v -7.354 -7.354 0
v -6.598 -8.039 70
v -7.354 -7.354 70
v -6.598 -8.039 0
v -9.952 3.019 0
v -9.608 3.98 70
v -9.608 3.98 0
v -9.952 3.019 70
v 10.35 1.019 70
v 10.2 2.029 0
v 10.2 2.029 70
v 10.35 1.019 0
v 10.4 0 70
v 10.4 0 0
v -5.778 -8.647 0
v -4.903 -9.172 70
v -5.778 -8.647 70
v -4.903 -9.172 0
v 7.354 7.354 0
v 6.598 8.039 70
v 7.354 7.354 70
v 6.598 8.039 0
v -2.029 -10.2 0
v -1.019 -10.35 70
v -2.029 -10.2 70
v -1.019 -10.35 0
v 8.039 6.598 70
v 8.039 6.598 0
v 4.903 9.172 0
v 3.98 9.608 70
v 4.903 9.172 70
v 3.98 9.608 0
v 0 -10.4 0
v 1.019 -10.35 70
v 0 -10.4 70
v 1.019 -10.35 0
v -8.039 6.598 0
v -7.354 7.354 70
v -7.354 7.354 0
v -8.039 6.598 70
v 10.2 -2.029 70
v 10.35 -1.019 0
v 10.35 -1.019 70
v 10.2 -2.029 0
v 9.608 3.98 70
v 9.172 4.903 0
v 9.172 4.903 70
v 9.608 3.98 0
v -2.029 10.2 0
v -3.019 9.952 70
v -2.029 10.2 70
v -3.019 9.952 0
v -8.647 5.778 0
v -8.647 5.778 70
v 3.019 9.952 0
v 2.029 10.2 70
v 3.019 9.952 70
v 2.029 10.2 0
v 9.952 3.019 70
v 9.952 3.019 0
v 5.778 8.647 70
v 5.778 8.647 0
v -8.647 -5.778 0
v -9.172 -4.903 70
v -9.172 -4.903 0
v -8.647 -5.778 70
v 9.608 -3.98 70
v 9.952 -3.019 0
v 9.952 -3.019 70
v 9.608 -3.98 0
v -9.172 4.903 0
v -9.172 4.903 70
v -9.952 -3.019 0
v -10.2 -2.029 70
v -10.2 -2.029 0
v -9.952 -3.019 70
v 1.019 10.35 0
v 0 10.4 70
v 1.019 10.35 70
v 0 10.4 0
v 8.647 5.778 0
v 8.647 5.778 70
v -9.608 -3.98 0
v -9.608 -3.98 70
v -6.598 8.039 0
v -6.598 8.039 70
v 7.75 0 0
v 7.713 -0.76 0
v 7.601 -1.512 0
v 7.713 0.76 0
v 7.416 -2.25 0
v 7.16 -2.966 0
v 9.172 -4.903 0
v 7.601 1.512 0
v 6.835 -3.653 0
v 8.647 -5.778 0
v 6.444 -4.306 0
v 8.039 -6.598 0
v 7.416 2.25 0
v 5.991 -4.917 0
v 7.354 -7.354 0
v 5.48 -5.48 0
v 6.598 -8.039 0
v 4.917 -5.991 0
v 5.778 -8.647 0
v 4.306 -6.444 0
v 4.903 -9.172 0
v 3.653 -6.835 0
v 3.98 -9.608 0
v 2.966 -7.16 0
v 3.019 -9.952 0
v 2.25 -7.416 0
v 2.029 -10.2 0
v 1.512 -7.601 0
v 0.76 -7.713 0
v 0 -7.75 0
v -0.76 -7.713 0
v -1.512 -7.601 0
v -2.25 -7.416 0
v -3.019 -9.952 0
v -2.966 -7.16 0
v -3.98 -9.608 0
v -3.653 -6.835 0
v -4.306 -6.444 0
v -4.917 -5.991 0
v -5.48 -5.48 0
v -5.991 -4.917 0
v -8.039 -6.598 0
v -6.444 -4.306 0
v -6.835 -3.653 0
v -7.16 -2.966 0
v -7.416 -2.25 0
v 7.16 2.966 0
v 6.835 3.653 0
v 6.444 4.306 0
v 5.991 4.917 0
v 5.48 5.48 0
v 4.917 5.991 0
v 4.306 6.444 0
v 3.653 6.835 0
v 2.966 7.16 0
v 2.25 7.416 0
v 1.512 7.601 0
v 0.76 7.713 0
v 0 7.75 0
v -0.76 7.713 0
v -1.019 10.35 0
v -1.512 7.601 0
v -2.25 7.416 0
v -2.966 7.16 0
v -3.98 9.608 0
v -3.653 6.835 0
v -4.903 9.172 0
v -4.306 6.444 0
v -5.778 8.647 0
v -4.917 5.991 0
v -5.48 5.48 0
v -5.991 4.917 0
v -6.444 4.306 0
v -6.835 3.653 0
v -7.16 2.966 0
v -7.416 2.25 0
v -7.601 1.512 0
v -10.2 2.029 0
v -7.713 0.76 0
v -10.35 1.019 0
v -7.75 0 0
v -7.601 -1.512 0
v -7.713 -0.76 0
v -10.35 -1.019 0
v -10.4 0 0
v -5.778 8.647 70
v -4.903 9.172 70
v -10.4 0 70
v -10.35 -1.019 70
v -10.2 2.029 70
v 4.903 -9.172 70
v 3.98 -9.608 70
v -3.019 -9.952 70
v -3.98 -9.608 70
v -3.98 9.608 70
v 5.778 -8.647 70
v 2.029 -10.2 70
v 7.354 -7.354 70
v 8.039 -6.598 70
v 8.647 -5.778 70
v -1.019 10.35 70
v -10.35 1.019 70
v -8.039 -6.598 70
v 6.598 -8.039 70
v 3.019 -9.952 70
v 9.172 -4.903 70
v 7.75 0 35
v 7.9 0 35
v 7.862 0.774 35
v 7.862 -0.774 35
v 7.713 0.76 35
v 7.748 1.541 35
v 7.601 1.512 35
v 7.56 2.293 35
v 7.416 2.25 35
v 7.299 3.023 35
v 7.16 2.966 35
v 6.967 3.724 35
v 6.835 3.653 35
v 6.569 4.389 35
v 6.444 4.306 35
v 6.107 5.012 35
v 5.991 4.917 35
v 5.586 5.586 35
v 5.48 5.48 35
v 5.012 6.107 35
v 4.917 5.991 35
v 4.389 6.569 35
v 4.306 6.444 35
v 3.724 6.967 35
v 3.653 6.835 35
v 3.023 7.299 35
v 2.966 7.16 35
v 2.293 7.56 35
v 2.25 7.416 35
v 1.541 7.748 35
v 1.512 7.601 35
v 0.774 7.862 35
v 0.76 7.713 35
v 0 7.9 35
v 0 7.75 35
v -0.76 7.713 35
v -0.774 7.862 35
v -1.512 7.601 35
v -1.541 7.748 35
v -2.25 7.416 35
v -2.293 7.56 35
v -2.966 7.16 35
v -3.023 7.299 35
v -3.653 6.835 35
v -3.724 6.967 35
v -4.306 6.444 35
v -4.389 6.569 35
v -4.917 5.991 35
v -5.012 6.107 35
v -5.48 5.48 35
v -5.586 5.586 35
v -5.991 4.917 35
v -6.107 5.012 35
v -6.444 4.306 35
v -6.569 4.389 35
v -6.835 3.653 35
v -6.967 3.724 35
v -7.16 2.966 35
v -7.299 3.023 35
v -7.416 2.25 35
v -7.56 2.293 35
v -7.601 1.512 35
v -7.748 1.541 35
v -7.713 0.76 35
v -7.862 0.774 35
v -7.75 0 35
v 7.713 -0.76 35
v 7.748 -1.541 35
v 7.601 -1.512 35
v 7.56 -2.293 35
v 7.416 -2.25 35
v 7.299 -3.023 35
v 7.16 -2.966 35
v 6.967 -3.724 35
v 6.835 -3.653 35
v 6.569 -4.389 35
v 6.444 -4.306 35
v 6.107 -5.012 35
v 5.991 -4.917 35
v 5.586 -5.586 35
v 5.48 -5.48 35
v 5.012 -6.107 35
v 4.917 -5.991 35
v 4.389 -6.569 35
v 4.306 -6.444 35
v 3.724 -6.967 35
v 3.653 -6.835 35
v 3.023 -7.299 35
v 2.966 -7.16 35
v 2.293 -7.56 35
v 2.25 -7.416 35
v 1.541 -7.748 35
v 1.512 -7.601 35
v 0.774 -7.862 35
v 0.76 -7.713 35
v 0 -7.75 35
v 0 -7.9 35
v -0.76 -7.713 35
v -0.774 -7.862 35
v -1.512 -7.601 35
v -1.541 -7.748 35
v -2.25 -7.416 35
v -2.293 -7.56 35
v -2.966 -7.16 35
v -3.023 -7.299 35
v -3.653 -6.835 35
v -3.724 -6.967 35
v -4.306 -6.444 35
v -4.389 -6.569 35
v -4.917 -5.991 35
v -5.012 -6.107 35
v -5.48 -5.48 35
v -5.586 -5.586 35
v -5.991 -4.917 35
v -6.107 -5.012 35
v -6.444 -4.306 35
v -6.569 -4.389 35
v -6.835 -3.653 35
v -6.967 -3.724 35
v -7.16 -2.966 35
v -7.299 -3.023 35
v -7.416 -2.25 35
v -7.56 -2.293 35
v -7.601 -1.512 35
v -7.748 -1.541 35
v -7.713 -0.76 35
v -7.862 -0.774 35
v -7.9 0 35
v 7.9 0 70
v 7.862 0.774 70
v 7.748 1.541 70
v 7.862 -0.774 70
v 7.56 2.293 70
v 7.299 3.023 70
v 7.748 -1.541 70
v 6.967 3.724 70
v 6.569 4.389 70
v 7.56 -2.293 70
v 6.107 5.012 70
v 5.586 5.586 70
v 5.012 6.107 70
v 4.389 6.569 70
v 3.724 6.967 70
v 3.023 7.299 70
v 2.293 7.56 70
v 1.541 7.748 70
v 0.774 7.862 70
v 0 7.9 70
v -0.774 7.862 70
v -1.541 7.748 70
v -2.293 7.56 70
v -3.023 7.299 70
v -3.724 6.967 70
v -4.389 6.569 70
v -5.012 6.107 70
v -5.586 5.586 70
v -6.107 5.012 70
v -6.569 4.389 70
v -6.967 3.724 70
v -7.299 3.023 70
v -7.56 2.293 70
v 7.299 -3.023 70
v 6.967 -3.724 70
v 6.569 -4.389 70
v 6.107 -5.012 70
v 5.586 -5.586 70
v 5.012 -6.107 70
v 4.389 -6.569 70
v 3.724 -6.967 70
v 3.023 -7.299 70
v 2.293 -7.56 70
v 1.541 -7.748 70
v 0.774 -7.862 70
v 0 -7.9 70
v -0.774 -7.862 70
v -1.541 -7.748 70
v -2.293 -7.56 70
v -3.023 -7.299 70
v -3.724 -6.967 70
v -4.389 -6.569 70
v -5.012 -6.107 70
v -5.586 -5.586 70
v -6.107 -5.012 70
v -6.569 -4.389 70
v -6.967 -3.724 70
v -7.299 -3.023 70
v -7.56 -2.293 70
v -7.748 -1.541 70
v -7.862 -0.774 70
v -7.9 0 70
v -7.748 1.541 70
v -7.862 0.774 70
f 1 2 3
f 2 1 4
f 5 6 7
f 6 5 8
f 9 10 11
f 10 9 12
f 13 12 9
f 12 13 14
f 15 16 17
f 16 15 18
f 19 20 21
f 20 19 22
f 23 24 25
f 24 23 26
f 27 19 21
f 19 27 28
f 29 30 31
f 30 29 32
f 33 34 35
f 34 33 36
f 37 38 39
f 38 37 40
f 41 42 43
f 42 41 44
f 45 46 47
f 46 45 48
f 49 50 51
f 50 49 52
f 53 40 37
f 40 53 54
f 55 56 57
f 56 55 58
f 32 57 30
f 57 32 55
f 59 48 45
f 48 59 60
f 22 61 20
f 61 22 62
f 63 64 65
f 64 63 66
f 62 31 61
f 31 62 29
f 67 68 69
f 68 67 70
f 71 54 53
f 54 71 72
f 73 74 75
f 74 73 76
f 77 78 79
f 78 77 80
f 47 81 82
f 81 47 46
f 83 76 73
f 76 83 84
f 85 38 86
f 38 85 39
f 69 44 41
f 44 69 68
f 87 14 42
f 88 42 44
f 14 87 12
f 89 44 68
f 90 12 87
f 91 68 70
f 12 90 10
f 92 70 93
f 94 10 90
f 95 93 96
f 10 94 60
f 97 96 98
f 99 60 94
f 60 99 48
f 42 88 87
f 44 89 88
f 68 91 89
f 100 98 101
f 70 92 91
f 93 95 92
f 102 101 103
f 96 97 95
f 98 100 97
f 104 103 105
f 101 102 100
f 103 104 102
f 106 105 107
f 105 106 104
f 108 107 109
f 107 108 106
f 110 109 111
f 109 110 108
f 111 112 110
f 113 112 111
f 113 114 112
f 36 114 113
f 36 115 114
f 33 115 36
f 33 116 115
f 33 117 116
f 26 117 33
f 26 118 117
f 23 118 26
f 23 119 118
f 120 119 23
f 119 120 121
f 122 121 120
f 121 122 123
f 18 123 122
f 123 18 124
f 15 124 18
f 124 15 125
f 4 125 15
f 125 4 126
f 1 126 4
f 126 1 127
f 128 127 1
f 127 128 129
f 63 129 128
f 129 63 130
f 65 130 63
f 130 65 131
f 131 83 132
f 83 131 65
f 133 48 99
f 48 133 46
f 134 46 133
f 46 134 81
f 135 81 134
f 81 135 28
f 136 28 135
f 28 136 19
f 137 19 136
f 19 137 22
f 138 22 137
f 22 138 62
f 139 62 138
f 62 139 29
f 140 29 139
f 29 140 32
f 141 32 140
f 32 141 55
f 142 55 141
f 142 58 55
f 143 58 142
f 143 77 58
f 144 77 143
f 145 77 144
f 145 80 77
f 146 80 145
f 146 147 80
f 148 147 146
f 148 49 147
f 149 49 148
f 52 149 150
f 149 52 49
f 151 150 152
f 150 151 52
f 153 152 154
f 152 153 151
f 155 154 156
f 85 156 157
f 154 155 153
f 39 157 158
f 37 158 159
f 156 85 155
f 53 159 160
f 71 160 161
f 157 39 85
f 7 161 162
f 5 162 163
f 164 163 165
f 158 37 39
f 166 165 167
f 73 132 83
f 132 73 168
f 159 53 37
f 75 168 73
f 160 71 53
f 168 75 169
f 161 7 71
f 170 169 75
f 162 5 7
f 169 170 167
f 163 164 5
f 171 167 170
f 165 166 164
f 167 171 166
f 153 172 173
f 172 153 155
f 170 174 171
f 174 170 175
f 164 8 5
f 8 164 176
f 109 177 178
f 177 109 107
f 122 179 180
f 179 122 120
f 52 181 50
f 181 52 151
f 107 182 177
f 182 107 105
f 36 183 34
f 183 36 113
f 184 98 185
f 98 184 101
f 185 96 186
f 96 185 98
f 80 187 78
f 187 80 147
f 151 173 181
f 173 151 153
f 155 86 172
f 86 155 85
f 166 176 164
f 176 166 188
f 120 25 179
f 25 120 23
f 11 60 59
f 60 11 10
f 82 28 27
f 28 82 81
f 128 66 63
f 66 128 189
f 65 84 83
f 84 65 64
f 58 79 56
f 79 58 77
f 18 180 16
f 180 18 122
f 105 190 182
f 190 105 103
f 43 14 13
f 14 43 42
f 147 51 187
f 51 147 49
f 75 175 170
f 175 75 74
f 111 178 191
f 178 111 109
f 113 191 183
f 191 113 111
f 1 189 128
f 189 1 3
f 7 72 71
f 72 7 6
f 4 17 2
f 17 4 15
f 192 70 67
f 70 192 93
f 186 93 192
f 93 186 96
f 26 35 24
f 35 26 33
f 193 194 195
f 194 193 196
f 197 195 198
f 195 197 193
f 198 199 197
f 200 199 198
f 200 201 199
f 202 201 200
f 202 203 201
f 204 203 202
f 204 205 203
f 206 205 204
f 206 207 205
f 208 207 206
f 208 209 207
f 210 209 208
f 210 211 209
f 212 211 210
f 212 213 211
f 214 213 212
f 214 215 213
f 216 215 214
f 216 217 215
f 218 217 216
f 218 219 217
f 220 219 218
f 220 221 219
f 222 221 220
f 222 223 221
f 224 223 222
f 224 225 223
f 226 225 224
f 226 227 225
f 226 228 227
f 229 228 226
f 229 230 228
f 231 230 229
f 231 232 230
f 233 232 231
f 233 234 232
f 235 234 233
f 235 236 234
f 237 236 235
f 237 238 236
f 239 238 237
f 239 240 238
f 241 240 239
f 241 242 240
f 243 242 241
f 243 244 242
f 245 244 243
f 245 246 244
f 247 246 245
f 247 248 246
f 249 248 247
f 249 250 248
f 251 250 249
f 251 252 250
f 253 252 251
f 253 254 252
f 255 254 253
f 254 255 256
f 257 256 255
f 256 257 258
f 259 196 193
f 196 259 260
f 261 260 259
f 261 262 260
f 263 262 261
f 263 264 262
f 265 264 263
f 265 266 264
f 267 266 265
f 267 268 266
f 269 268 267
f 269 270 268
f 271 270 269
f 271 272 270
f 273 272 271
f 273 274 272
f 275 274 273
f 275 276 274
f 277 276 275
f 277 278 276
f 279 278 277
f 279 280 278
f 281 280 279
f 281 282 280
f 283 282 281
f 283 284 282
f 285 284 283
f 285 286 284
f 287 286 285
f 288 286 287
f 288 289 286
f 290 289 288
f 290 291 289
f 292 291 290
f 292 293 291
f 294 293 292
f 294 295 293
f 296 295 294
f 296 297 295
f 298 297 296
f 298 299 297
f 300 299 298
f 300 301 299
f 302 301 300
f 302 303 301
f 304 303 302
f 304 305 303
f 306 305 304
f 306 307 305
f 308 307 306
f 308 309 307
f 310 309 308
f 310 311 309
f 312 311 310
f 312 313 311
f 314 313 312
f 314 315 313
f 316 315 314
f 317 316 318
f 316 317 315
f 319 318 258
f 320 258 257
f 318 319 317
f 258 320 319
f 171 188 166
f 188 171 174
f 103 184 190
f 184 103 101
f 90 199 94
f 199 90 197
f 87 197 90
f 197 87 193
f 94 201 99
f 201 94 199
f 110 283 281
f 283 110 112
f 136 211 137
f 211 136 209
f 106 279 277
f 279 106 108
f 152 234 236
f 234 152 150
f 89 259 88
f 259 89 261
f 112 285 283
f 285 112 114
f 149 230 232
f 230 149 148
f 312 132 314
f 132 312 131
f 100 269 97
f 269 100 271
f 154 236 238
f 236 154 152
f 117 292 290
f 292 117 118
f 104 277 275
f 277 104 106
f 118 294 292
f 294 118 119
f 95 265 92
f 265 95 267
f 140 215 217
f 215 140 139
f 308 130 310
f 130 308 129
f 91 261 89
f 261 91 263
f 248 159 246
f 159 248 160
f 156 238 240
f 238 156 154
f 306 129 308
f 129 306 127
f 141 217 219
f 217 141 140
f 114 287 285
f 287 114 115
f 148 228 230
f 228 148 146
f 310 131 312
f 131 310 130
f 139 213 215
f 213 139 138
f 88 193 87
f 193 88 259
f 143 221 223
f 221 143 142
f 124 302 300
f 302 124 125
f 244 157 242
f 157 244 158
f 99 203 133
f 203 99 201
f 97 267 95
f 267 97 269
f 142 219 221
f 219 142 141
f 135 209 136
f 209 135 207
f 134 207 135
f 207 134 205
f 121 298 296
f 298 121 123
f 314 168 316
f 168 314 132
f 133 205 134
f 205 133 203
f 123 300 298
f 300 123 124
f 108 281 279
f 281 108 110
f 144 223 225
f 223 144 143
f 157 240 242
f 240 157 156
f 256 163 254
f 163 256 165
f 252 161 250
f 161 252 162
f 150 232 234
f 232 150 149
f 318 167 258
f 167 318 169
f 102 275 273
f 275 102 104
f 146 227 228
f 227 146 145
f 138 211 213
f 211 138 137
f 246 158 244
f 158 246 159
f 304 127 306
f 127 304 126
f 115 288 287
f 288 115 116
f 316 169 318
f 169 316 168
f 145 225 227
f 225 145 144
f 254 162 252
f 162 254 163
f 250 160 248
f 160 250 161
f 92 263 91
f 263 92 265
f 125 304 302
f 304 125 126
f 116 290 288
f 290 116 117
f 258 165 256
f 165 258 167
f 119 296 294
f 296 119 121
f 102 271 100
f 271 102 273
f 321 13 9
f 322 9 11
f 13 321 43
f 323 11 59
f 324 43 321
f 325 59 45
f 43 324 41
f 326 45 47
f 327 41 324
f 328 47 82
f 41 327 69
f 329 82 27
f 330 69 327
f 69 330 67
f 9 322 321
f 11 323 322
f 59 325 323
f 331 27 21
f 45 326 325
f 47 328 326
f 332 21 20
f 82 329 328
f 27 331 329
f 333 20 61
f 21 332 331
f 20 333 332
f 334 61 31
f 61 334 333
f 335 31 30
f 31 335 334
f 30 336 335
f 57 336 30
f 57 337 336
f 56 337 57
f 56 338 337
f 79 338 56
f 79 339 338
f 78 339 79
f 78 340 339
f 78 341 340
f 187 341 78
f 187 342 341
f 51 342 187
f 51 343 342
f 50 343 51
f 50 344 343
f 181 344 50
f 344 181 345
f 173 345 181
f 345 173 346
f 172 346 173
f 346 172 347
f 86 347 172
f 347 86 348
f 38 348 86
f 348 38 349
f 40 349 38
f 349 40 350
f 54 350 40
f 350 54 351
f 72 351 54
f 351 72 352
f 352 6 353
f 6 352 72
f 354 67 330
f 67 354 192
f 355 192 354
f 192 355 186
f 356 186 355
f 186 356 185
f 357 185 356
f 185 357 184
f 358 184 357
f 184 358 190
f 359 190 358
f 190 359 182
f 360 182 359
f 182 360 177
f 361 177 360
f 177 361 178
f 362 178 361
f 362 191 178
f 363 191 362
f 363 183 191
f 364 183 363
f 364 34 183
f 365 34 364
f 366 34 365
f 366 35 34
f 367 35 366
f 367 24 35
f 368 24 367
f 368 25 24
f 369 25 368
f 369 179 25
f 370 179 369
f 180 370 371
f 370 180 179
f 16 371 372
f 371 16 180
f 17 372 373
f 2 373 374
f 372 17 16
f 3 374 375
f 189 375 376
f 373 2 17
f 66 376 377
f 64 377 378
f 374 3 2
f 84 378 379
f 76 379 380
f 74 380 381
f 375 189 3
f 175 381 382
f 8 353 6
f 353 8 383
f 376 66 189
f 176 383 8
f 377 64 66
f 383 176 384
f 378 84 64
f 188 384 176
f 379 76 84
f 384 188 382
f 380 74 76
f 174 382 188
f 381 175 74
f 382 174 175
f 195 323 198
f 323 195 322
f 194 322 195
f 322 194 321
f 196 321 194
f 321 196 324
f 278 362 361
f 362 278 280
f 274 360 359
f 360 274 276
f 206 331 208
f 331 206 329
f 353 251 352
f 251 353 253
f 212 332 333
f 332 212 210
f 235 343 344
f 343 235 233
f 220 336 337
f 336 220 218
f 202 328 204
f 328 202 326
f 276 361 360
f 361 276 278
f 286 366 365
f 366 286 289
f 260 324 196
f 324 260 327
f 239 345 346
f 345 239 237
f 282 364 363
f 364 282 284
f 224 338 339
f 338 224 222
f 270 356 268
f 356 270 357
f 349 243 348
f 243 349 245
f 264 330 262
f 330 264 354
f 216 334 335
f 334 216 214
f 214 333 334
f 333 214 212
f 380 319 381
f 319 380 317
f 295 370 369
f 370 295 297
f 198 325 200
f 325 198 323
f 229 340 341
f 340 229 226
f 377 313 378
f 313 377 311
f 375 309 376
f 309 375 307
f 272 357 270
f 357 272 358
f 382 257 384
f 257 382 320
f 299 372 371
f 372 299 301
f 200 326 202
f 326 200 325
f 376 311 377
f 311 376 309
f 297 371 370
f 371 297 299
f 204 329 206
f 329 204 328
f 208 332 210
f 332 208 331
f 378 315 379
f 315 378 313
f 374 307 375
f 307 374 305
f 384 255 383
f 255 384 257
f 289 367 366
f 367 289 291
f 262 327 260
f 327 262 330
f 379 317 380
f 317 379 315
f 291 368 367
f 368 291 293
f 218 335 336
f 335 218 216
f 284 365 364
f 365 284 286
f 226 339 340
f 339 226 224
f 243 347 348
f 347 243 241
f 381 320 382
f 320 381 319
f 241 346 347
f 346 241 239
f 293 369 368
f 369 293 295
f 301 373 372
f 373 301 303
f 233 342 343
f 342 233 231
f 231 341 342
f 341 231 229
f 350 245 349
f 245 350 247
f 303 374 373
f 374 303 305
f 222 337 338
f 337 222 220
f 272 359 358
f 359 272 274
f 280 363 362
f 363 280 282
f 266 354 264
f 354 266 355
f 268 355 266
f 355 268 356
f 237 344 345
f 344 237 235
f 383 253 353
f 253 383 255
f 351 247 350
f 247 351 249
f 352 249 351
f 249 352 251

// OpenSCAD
// Dryer Drain Hose Adapter
//
// Description:
// Adapts a dryer drain hose (Male) to a washing machine drain port (Male).
// Both sides are Female (Holes).
//
// Dimensions (with shrinkage compensation +1.0mm applied):
// - Side A (Dryer): Hose OD 15.2mm -> Hole ID 16.2mm
// - Side B (Washer): Port OD 14.5mm -> Hole ID 15.5mm
// - Insertion Depth: 25mm each

$fn = 64;

// --- Parameters ---

// Side A (Dryer - Top)
hose_a_target_od = 15.2;
hose_a_shrinkage_comp = 0.6; // Reduced from 1.0 based on feedback (Total -0.4mm)
hose_a_id = hose_a_target_od + hose_a_shrinkage_comp; // 15.8mm
hose_a_depth = 35.0; // Increased from 25.0

// Side B (Washer - Bottom)
hose_b_target_od = 14.5;
hose_b_shrinkage_comp = 1.0; // Good fit, kept as is
hose_b_id = hose_b_target_od + hose_b_shrinkage_comp; // 15.5mm
hose_b_depth = 35.0; // Increased from 25.0

// Adapter Wall
wall_thickness = 2.5;

// Outer Diameter (Unified for printability)
// Use the largest ID to determine the minimum OD, then apply consistent OD.
max_id = max(hose_a_id, hose_b_id);
adapter_od = max_id + (wall_thickness * 2);

// --- Modules ---

module drain_adapter() {
  union() {
    // Side B (Bottom) - Washer Side
    difference() {
      cylinder(d = adapter_od, h = hose_b_depth);
      translate([0, 0, -0.1])
        cylinder(d = hose_b_id, h = hose_b_depth + 0.2);
    }
    
    // Side A (Top) - Dryer Side
    // Stacked on top of Side B
    translate([0, 0, hose_b_depth])
    difference() {
      cylinder(d = adapter_od, h = hose_a_depth);
      translate([0, 0, -0.1])
        cylinder(d = hose_a_id, h = hose_a_depth + 0.2);
    }
    
    // Internal Stopper / Transition
    // Since IDs are different (16.2 vs 15.5), there is a naturally formed step of 0.35mm radius.
    // This serves as a stopper so the hoses don't slide through indefinitely.
    // If a more prominent stopper is needed, we could add a ring in between.
    // For now, the natural step plus the fact that they meet in the middle is good.
  }
}

drain_adapter();
